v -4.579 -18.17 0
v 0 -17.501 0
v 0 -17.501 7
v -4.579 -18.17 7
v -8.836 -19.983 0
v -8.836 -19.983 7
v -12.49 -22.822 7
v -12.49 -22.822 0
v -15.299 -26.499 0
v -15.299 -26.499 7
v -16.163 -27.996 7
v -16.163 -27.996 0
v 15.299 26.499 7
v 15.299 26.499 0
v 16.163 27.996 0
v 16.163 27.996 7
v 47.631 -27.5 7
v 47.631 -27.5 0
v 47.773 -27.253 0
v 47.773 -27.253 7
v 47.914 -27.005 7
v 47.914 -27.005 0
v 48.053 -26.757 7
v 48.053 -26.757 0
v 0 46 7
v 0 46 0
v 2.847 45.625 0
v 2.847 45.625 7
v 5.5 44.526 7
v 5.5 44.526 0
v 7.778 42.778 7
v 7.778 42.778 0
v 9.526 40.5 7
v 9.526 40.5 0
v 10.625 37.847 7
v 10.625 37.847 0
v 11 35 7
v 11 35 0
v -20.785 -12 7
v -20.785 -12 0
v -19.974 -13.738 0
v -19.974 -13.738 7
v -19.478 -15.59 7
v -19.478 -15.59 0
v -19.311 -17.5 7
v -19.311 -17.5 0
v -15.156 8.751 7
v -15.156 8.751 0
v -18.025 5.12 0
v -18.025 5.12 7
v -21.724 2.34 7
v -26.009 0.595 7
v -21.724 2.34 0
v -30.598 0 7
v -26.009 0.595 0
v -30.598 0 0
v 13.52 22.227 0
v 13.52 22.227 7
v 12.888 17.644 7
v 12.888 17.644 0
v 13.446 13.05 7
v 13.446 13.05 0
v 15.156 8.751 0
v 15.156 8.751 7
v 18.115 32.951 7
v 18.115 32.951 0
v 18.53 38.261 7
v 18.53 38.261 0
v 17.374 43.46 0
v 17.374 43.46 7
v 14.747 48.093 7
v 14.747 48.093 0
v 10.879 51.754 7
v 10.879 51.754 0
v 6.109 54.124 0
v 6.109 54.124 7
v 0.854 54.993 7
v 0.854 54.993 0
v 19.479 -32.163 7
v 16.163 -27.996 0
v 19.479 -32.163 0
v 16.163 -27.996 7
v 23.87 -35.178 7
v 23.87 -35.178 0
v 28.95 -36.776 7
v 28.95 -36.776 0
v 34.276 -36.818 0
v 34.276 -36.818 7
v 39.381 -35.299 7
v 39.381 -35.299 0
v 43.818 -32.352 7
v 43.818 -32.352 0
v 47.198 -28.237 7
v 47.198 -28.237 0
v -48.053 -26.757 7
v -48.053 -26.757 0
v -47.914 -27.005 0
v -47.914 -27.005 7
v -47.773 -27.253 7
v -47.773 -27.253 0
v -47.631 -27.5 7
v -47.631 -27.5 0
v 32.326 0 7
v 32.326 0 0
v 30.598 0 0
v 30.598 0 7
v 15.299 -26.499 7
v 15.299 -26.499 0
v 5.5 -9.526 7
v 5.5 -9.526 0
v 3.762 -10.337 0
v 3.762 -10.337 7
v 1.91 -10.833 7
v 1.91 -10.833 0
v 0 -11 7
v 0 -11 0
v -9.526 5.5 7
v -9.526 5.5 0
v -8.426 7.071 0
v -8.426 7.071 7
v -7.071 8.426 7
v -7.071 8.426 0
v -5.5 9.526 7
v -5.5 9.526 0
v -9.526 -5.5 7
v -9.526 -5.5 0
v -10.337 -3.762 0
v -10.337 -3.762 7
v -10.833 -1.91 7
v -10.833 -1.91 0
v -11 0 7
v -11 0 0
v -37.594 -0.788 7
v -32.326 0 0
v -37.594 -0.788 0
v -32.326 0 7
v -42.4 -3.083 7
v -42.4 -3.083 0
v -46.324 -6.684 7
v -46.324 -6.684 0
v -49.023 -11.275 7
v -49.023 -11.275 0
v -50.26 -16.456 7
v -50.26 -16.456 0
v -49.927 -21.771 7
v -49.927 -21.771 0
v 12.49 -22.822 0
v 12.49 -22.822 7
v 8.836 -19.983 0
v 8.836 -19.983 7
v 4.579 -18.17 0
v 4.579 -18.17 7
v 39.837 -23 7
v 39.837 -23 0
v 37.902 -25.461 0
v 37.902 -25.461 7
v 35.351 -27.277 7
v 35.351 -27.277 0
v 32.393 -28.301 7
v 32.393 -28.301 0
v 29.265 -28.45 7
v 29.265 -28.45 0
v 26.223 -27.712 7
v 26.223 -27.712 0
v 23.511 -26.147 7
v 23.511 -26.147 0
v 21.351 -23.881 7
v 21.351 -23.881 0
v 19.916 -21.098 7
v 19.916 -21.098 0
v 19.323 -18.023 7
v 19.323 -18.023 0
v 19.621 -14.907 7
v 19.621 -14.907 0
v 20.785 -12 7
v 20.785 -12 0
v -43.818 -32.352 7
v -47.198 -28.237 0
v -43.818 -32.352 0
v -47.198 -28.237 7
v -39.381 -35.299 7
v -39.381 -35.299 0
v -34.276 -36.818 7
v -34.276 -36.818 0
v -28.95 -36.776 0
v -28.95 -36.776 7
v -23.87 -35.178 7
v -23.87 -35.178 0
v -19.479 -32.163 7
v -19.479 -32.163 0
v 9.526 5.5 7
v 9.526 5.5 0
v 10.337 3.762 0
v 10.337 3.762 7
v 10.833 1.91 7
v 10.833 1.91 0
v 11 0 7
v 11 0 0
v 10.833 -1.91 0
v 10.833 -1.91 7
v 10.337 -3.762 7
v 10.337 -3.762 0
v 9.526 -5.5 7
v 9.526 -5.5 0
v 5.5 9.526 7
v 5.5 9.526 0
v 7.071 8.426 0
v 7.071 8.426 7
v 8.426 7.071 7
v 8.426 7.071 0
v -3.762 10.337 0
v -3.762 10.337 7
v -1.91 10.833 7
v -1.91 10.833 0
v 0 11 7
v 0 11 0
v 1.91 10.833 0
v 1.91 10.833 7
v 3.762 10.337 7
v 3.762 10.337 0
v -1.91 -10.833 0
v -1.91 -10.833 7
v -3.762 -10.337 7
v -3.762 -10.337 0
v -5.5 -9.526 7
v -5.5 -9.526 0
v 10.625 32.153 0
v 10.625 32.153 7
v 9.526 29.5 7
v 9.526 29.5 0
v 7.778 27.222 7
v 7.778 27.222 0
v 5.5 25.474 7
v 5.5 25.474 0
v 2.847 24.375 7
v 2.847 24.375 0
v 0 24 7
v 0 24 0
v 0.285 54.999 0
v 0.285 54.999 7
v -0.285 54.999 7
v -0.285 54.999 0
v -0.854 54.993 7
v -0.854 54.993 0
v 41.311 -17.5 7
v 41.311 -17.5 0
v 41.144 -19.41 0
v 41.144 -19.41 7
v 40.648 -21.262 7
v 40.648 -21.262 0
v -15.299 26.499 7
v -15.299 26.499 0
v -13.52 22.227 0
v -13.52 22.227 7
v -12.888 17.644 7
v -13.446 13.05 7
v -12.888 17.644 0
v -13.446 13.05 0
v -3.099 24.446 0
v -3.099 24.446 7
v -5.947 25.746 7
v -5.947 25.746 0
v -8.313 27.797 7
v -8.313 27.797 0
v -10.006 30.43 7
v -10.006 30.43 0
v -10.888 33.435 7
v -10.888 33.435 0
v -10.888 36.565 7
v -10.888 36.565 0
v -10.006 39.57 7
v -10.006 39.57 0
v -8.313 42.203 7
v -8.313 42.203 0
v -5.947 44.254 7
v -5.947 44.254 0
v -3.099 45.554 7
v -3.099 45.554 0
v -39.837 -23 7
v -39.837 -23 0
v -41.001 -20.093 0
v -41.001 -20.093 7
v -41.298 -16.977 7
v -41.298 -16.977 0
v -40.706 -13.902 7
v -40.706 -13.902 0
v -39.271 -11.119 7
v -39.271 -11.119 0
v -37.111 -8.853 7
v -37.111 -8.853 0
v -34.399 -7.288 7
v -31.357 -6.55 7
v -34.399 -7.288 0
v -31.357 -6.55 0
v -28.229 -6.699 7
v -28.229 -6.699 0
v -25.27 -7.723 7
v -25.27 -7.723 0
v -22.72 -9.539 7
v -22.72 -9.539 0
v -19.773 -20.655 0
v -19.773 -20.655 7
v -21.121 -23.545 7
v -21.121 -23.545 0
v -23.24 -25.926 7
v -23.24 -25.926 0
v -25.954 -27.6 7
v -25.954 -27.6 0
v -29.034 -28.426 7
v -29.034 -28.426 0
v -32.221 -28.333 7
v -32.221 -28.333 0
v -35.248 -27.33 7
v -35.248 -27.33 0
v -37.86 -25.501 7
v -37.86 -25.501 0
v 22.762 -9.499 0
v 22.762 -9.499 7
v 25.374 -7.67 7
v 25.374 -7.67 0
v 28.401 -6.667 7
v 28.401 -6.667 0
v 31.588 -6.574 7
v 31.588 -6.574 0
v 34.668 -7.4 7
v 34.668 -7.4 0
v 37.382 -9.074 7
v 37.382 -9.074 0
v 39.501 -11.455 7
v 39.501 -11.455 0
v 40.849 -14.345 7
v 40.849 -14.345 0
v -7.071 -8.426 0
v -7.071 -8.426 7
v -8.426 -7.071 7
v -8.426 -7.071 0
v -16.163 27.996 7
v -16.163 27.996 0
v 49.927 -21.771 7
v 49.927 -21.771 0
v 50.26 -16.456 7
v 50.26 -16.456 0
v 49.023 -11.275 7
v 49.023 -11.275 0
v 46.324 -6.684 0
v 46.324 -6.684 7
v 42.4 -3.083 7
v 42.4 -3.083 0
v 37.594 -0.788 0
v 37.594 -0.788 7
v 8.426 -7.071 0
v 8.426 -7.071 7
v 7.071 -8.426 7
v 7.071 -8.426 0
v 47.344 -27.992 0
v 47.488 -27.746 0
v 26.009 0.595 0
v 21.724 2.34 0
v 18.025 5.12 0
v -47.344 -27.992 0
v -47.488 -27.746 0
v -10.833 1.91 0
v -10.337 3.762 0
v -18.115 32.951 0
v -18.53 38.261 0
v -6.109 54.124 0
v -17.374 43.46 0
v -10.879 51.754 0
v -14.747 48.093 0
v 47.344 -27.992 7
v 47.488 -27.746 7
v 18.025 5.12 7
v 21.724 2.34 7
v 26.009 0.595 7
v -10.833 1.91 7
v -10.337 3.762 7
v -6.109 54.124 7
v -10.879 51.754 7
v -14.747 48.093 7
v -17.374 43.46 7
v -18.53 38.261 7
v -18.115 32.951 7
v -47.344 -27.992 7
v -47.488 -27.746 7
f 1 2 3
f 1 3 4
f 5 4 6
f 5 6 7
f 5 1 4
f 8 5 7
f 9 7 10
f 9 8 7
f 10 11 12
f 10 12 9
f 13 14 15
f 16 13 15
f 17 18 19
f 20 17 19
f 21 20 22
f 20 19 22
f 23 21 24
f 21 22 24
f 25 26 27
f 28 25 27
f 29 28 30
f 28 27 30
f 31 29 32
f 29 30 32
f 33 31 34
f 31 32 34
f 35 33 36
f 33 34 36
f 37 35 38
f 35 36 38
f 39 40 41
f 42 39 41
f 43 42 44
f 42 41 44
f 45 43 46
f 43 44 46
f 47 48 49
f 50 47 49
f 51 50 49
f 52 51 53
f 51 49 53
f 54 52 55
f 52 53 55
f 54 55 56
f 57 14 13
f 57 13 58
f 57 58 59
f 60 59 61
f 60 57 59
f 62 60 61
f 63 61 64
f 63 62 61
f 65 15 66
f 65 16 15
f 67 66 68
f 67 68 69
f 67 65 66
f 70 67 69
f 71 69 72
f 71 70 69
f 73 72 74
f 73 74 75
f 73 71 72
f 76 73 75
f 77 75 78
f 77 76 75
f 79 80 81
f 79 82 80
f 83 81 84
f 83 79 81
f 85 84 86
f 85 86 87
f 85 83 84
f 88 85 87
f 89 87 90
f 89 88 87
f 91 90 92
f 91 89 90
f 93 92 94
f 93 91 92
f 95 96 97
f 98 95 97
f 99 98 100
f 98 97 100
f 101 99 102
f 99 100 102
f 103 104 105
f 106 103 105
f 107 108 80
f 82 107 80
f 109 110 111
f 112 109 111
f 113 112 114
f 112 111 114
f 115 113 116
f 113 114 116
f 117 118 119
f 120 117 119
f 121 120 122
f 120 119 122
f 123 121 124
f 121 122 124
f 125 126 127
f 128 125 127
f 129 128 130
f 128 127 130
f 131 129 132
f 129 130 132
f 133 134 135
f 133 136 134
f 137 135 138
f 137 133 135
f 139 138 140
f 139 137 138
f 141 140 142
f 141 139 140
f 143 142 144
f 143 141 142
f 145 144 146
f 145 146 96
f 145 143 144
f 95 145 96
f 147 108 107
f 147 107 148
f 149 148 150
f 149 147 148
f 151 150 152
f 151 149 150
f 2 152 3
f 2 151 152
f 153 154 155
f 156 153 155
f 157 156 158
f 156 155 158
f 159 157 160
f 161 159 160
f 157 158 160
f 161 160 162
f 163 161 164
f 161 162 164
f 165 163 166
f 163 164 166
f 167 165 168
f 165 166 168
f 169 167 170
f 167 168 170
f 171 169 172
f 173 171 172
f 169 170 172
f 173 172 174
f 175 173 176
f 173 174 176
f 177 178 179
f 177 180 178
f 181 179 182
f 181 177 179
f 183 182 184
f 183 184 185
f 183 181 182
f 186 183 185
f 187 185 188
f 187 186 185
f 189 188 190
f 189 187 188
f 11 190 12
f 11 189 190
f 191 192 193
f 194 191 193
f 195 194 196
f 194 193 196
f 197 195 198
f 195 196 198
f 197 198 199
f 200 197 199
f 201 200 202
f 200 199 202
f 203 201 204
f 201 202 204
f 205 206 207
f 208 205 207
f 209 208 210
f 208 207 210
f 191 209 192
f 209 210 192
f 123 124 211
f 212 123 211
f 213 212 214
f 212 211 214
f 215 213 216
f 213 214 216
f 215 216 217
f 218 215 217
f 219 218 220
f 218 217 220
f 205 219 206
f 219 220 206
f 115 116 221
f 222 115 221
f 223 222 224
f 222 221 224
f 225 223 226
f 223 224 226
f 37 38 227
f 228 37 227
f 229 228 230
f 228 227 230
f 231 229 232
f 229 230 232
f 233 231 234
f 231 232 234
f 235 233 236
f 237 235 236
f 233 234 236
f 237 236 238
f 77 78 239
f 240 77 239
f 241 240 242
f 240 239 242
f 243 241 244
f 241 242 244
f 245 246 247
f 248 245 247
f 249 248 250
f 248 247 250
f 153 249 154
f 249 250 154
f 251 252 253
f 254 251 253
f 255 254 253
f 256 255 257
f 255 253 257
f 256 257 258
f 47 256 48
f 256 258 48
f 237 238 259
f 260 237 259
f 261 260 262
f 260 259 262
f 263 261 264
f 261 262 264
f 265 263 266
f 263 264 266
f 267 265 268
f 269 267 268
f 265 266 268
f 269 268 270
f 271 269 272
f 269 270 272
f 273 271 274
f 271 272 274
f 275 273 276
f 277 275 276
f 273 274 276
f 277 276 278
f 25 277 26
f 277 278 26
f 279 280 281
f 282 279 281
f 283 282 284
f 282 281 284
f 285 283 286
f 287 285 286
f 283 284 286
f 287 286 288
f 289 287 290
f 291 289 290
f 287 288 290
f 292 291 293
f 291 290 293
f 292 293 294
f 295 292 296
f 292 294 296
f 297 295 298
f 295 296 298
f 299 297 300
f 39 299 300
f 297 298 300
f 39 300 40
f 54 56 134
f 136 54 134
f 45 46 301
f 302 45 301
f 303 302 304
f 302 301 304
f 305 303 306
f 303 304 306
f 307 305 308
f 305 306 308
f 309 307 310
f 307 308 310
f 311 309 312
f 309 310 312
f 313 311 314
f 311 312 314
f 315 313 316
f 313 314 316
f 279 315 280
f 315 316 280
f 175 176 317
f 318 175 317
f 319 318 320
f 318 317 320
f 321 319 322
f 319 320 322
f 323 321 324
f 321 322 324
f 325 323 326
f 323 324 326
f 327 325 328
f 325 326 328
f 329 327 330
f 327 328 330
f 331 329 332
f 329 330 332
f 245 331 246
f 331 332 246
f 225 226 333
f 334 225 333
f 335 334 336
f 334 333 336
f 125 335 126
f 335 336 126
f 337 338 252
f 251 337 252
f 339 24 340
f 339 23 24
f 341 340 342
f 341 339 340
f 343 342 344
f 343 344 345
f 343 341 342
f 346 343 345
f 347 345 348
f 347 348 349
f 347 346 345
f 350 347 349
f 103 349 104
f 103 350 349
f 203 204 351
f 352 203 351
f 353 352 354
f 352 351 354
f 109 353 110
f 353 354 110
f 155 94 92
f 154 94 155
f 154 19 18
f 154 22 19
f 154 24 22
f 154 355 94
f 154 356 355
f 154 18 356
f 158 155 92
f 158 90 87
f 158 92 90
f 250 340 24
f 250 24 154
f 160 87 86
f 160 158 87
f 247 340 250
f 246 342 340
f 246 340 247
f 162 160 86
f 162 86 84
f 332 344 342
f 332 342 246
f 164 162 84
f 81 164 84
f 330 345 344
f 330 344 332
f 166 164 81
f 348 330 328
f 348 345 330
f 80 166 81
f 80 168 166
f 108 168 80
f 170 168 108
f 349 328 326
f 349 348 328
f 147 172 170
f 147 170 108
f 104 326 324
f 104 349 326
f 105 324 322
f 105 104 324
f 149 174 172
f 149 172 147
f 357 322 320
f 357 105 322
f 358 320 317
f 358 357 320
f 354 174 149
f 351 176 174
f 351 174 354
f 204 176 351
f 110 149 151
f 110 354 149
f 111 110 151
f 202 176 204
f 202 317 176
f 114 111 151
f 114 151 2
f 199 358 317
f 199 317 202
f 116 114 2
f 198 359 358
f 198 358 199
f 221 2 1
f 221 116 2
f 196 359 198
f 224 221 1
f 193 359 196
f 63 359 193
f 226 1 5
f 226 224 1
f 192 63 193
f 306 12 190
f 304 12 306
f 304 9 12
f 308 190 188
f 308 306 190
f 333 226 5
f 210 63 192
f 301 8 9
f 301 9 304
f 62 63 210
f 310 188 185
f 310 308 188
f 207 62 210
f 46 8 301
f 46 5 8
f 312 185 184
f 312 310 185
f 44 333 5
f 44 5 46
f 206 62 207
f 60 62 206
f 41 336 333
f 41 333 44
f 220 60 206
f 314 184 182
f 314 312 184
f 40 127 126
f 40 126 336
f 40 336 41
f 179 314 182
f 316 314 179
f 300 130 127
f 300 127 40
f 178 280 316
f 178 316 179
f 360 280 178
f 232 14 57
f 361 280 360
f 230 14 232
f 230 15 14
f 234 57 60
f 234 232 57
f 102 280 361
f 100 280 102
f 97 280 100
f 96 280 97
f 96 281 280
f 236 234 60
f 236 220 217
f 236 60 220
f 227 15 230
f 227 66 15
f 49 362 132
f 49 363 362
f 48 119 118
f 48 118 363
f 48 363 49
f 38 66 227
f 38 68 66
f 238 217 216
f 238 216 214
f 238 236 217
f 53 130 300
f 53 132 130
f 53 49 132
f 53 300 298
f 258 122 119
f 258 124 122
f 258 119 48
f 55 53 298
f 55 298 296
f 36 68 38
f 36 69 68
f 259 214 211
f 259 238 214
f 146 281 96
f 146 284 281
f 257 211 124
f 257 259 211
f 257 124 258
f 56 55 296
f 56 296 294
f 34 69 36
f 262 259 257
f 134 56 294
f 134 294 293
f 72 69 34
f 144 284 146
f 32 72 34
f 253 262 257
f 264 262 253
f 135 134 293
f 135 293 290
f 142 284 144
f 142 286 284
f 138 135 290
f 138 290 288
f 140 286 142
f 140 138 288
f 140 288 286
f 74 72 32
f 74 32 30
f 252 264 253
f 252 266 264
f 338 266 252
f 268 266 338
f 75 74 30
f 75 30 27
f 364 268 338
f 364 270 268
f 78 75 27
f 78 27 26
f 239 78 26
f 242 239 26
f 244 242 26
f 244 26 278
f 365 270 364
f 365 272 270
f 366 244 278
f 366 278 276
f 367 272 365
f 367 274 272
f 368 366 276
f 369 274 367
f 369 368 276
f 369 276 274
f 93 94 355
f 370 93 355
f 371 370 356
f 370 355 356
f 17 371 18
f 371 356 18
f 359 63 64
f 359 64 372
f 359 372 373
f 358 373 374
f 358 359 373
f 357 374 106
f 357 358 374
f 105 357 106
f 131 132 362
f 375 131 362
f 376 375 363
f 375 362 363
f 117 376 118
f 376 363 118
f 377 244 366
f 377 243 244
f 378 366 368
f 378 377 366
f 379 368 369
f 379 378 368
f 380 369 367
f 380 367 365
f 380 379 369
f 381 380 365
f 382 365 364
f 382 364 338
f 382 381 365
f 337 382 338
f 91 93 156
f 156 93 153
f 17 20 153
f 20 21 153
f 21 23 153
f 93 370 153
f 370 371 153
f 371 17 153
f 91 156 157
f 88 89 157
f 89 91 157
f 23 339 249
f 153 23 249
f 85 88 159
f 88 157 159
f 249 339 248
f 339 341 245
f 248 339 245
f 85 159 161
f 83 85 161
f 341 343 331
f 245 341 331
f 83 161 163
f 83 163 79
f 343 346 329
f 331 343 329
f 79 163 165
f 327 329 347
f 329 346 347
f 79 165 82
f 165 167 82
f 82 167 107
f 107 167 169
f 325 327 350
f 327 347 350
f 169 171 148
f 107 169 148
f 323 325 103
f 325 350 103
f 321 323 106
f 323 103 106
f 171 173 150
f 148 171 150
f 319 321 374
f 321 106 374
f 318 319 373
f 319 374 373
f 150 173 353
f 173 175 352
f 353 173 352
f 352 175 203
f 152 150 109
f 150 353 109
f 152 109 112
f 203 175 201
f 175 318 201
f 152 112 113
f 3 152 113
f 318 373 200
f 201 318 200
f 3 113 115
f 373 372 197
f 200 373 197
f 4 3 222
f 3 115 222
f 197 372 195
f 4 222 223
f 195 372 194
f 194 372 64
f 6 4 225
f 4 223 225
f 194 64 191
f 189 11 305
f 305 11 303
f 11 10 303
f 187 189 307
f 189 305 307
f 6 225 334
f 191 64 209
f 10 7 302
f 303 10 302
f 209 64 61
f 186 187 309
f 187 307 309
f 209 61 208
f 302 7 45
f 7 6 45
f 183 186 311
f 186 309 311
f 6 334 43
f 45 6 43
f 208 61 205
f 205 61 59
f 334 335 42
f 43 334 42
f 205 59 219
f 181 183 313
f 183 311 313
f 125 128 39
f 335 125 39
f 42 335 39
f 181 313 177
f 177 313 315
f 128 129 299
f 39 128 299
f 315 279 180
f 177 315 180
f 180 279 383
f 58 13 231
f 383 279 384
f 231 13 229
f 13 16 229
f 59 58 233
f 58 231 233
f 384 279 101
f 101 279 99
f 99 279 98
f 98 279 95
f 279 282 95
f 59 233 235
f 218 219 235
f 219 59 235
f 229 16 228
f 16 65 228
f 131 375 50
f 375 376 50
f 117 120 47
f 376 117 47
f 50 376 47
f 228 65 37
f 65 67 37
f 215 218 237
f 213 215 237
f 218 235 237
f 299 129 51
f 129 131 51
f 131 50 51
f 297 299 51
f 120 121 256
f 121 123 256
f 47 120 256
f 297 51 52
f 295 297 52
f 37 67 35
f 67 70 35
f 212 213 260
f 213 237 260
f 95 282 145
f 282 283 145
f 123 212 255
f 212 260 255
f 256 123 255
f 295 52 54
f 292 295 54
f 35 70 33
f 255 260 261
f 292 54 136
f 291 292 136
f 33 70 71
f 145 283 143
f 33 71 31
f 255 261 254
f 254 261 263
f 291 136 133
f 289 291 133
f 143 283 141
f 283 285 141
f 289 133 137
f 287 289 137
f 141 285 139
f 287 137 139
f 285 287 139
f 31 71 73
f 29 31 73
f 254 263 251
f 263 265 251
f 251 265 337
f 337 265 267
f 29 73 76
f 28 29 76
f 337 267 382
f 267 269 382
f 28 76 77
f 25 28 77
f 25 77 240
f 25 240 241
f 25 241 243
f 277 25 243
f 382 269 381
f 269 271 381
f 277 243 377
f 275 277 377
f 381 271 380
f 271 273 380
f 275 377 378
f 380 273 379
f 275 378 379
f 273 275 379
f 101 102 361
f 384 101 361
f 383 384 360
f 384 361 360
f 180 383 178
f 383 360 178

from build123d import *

# Parameters (mm, degrees)
F1_DEPTH    = 7
F2_R        = 18
F3_T1_DEPTH = 7


# Not quite as in the source:
# - a fillet or chamfer that OpenCascade refuses, or shapes differently, is made with other operations: its cross-section is extruded or revolved along the edge and cut away or added


with BuildPart() as f1:
    # F0 (on Top) → F1 (new body)
    with BuildSketch(Plane.XY):
        with BuildLine():
            ThreePointArc((9.5262794416, 5.5), (10.6251840892, 2.8470094961), (11, 0))
            Line((11, 0), (15, 0))
            ThreePointArc((15, 0), (14.4888873943, 3.8822856765), (12.9903810568, 7.5))
            Line((12.9903810568, 7.5), (9.5262794416, 5.5))
        make_face()
        with BuildLine():
            ThreePointArc((5.5, 9.5262794416), (7.7781745931, 7.7781745931), (9.5262794416, 5.5))
            Line((9.5262794416, 5.5), (12.9903810568, 7.5))
            ThreePointArc((12.9903810568, 7.5), (10.6066017178, 10.6066017178), (7.5, 12.9903810568))
            Line((7.5, 12.9903810568), (5.5, 9.5262794416))
        make_face()
        with BuildLine():
            ThreePointArc((0, 11), (2.8470094961, 10.6251840892), (5.5, 9.5262794416))
            Line((5.5, 9.5262794416), (7.5, 12.9903810568))
            ThreePointArc((7.5, 12.9903810568), (3.8822856765, 14.4888873943), (0, 15))
            Line((0, 15), (0, 11))
        make_face()
        with BuildLine():
            ThreePointArc((-5.5, 9.5262794416), (-2.8470094961, 10.6251840892), (0, 11))
            Line((0, 11), (0, 15))
            ThreePointArc((0, 15), (-3.8822856765, 14.4888873943), (-7.5, 12.9903810568))
            Line((-7.5, 12.9903810568), (-5.5, 9.5262794416))
        make_face()
        with BuildLine():
            ThreePointArc((-9.5262794416, 5.5), (-7.7781745931, 7.7781745931), (-5.5, 9.5262794416))
            Line((-5.5, 9.5262794416), (-7.5, 12.9903810568))
            ThreePointArc((-7.5, 12.9903810568), (-10.6066017178, 10.6066017178), (-12.9903810568, 7.5))
            Line((-12.9903810568, 7.5), (-9.5262794416, 5.5))
        make_face()
        with BuildLine():
            ThreePointArc((-11, 0), (-10.6251840892, 2.8470094961), (-9.5262794416, 5.5))
            Line((-9.5262794416, 5.5), (-12.9903810568, 7.5))
            ThreePointArc((-12.9903810568, 7.5), (-14.4888873943, 3.8822856765), (-15, 0))
            Line((-15, 0), (-11, 0))
        make_face()
        with BuildLine():
            Line((-12.9903810568, -7.5), (-9.5262794416, -5.5))
            ThreePointArc((-9.5262794416, -5.5), (-10.6251840892, -2.8470094961), (-11, 0))
            Line((-11, 0), (-15, 0))
            ThreePointArc((-15, 0), (-14.4888873943, -3.8822856765), (-12.9903810568, -7.5))
        make_face()
        with BuildLine():
            Line((-7.5, -12.9903810568), (-5.5, -9.5262794416))
            ThreePointArc((-5.5, -9.5262794416), (-7.7781745931, -7.7781745931), (-9.5262794416, -5.5))
            Line((-9.5262794416, -5.5), (-12.9903810568, -7.5))
            ThreePointArc((-12.9903810568, -7.5), (-10.6066017178, -10.6066017178), (-7.5, -12.9903810568))
        make_face()
        with BuildLine():
            Line((0, -15), (0, -11))
            ThreePointArc((0, -11), (-2.8470094961, -10.6251840892), (-5.5, -9.5262794416))
            Line((-5.5, -9.5262794416), (-7.5, -12.9903810568))
            ThreePointArc((-7.5, -12.9903810568), (-3.8822856765, -14.4888873943), (0, -15))
        make_face()
        with BuildLine():
            Line((7.5, -12.9903810568), (5.5, -9.5262794416))
            ThreePointArc((5.5, -9.5262794416), (2.8470094961, -10.6251840892), (0, -11))
            Line((0, -11), (0, -15))
            ThreePointArc((0, -15), (3.8822856765, -14.4888873943), (7.5, -12.9903810568))
        make_face()
        with BuildLine():
            Line((12.9903810568, -7.5), (9.5262794416, -5.5))
            ThreePointArc((9.5262794416, -5.5), (7.7781745931, -7.7781745931), (5.5, -9.5262794416))
            Line((5.5, -9.5262794416), (7.5, -12.9903810568))
            ThreePointArc((7.5, -12.9903810568), (10.6066017178, -10.6066017178), (12.9903810568, -7.5))
        make_face()
        with BuildLine():
            Line((15, 0), (11, 0))
            ThreePointArc((11, 0), (10.6251840892, -2.8470094961), (9.5262794416, -5.5))
            Line((9.5262794416, -5.5), (12.9903810568, -7.5))
            ThreePointArc((12.9903810568, -7.5), (14.4888873943, -3.8822856765), (15, 0))
        make_face()
        with BuildLine():
            Line((-8.75, -15.1554445662), (-7.5, -12.9903810568))
            ThreePointArc((-7.5, -12.9903810568), (-10.6066017178, -10.6066017178), (-12.9903810568, -7.5))
            Line((-12.9903810568, -7.5), (-15.1554445662, -8.75))
            ThreePointArc((-15.1554445662, -8.75), (-12.3743686708, -12.3743686708), (-8.75, -15.1554445662))
        make_face()
        with BuildLine():
            ThreePointArc((-7.5, 12.9903810568), (-3.8822856765, 14.4888873943), (0, 15))
            Line((0, 15), (0, 17.5))
            ThreePointArc((0, 17.5), (-4.5293332893, 16.9037019601), (-8.75, 15.1554445662))
            Line((-8.75, 15.1554445662), (-7.5, 12.9903810568))
        make_face()
        with BuildLine():
            ThreePointArc((0, 15), (3.8822856765, 14.4888873943), (7.5, 12.9903810568))
            Line((7.5, 12.9903810568), (8.75, 15.1554445662))
            ThreePointArc((8.75, 15.1554445662), (4.5293332893, 16.9037019601), (0, 17.5))
            Line((0, 17.5), (0, 15))
        make_face()
        with BuildLine():
            Line((-15.1554445662, -8.75), (-12.9903810568, -7.5))
            ThreePointArc((-12.9903810568, -7.5), (-14.4888873943, -3.8822856765), (-15, 0))
            Line((-15, 0), (-17.5, 0))
            ThreePointArc((-17.5, 0), (-16.9037019601, -4.5293332893), (-15.1554445662, -8.75))
        make_face()
        with BuildLine():
            Line((17.5, 0), (15, 0))
            ThreePointArc((15, 0), (14.4888873943, -3.8822856765), (12.9903810568, -7.5))
            Line((12.9903810568, -7.5), (15.1554445662, -8.75))
            ThreePointArc((15.1554445662, -8.75), (16.9037019601, -4.5293332893), (17.5, 0))
        make_face()
        with BuildLine():
            Line((15.1554445662, -8.75), (12.9903810568, -7.5))
            ThreePointArc((12.9903810568, -7.5), (10.6066017178, -10.6066017178), (7.5, -12.9903810568))
            Line((7.5, -12.9903810568), (8.75, -15.1554445662))
            ThreePointArc((8.75, -15.1554445662), (12.3743686708, -12.3743686708), (15.1554445662, -8.75))
        make_face()
        with BuildLine():
            Line((-20.7846096908, -12), (-17.3205080757, -10))
            ThreePointArc((-17.3205080757, -10), (-37.8108891325, -4.5096189432), (-43.3012701892, -25))
            Line((-43.3012701892, -25), (-39.8371685741, -23))
            ThreePointArc((-39.8371685741, -23), (-35.8108891325, -7.9737205584), (-20.7846096908, -12))
        make_face()
        with BuildLine():
            ThreePointArc((45.3108891325, -17.5), (34.193174809, -3.0111126057), (17.3205080757, -10))
            Line((17.3205080757, -10), (20.7846096908, -12))
            ThreePointArc((20.7846096908, -12), (33.1578986286, -6.8748159108), (41.3108891325, -17.5))
            ThreePointArc((41.3108891325, -17.5), (40.9360732216, -20.3470094961), (39.8371685741, -23))
            Line((39.8371685741, -23), (43.3012701892, -25))
            ThreePointArc((43.3012701892, -25), (44.7997765268, -21.3822856765), (45.3108891325, -17.5))
        make_face()
        with BuildLine():
            Line((20.7846096908, -12), (17.3205080757, -10))
            ThreePointArc((17.3205080757, -10), (22.8108891325, -30.4903810568), (43.3012701892, -25))
            Line((43.3012701892, -25), (39.8371685741, -23))
            ThreePointArc((39.8371685741, -23), (24.8108891325, -27.0262794416), (20.7846096908, -12))
        make_face()
        with BuildLine():
            ThreePointArc((0, 50), (-15, 35), (0, 20))
            Line((0, 20), (0, 24))
            ThreePointArc((0, 24), (-11, 35), (0, 46))
            Line((0, 46), (0, 50))
        make_face()
        with BuildLine():
            Line((0, 24), (0, 20))
            ThreePointArc((0, 20), (10.6066017178, 24.3933982822), (15, 35))
            ThreePointArc((15, 35), (10.6066017178, 45.6066017178), (0, 50))
            Line((0, 50), (0, 46))
            ThreePointArc((0, 46), (7.7781745931, 42.7781745931), (11, 35))
            ThreePointArc((11, 35), (7.7781745931, 27.2218254069), (0, 24))
        make_face()
        with BuildLine():
            ThreePointArc((-15.3108891325, -17.5), (-15.8220017381, -13.6177143235), (-17.3205080757, -10))
            Line((-17.3205080757, -10), (-20.7846096908, -12))
            ThreePointArc((-20.7846096908, -12), (-19.6857050433, -14.6529905039), (-19.3108891325, -17.5))
            ThreePointArc((-19.3108891325, -17.5), (-27.4638796363, -28.1251840892), (-39.8371685741, -23))
            Line((-39.8371685741, -23), (-43.3012701892, -25))
            ThreePointArc((-43.3012701892, -25), (-26.4286034559, -31.9888873943), (-15.3108891325, -17.5))
        make_face()
        with BuildLine():
            ThreePointArc((-8.75, 15.1554445662), (-4.5293332893, 16.9037019601), (0, 17.5))
            Line((0, 17.5), (0, 20))
            ThreePointArc((0, 20), (-15, 35), (0, 50))
            Line((0, 50), (0, 55))
            ThreePointArc((0, 55), (-14.2350474806, 53.1259204459), (-27.5, 47.6313972081))
            Line((-27.5, 47.6313972081), (-8.75, 15.1554445662))
        make_face()
        with BuildLine():
            ThreePointArc((-12.9903810568, 7.5), (-10.6066017178, 10.6066017178), (-7.5, 12.9903810568))
            Line((-7.5, 12.9903810568), (-8.75, 15.1554445662))
            ThreePointArc((-8.75, 15.1554445662), (-12.3743686708, 12.3743686708), (-15.1554445662, 8.75))
            Line((-15.1554445662, 8.75), (-12.9903810568, 7.5))
        make_face()
        with BuildLine():
            Line((-17.3205080757, -10), (-15.1554445662, -8.75))
            ThreePointArc((-15.1554445662, -8.75), (-16.9037019601, -4.5293332893), (-17.5, 0))
            Line((-17.5, 0), (-55, 0))
            ThreePointArc((-55, 0), (-53.1259204459, -14.2350474806), (-47.6313972081, -27.5))
            Line((-47.6313972081, -27.5), (-43.3012701892, -25))
            ThreePointArc((-43.3012701892, -25), (-37.8108891325, -4.5096189432), (-17.3205080757, -10))
        make_face()
        with BuildLine():
            Line((-27.5, -47.6313972081), (-8.75, -15.1554445662))
            ThreePointArc((-8.75, -15.1554445662), (-12.3743686708, -12.3743686708), (-15.1554445662, -8.75))
            Line((-15.1554445662, -8.75), (-17.3205080757, -10))
            ThreePointArc((-17.3205080757, -10), (-15.8220017381, -13.6177143235), (-15.3108891325, -17.5))
            ThreePointArc((-15.3108891325, -17.5), (-26.4286034559, -31.9888873943), (-43.3012701892, -25))
            Line((-43.3012701892, -25), (-47.6313972081, -27.5))
            ThreePointArc((-47.6313972081, -27.5), (-38.8908729653, -38.8908729653), (-27.5, -47.6313972081))
        make_face()
        with BuildLine():
            Line((0, -17.5), (0, -15))
            ThreePointArc((0, -15), (-3.8822856765, -14.4888873943), (-7.5, -12.9903810568))
            Line((-7.5, -12.9903810568), (-8.75, -15.1554445662))
            ThreePointArc((-8.75, -15.1554445662), (-4.5293332893, -16.9037019601), (0, -17.5))
        make_face()
        with BuildLine():
            Line((8.75, -15.1554445662), (7.5, -12.9903810568))
            ThreePointArc((7.5, -12.9903810568), (3.8822856765, -14.4888873943), (0, -15))
            Line((0, -15), (0, -17.5))
            ThreePointArc((0, -17.5), (4.5293332893, -16.9037019601), (8.75, -15.1554445662))
        make_face()
        with BuildLine():
            Line((17.3205080757, -10), (15.1554445662, -8.75))
            ThreePointArc((15.1554445662, -8.75), (12.3743686708, -12.3743686708), (8.75, -15.1554445662))
            Line((8.75, -15.1554445662), (27.5, -47.6313972081))
            ThreePointArc((27.5, -47.6313972081), (38.8908729653, -38.8908729653), (47.6313972081, -27.5))
            Line((47.6313972081, -27.5), (43.3012701892, -25))
            ThreePointArc((43.3012701892, -25), (22.8108891325, -30.4903810568), (17.3205080757, -10))
        make_face()
        with BuildLine():
            ThreePointArc((-15, 0), (-14.4888873943, 3.8822856765), (-12.9903810568, 7.5))
            Line((-12.9903810568, 7.5), (-15.1554445662, 8.75))
            ThreePointArc((-15.1554445662, 8.75), (-16.9037019601, 4.5293332893), (-17.5, 0))
            Line((-17.5, 0), (-15, 0))
        make_face()
        with BuildLine():
            ThreePointArc((0, 17.5), (4.5293332893, 16.9037019601), (8.75, 15.1554445662))
            Line((8.75, 15.1554445662), (27.5, 47.6313972081))
            ThreePointArc((27.5, 47.6313972081), (14.2350474806, 53.1259204459), (0, 55))
            Line((0, 55), (0, 50))
            ThreePointArc((0, 50), (10.6066017178, 45.6066017178), (15, 35))
            ThreePointArc((15, 35), (10.6066017178, 24.3933982822), (0, 20))
            Line((0, 20), (0, 17.5))
        make_face()
        with BuildLine():
            Line((55, 0), (17.5, 0))
            ThreePointArc((17.5, 0), (16.9037019601, -4.5293332893), (15.1554445662, -8.75))
            Line((15.1554445662, -8.75), (17.3205080757, -10))
            ThreePointArc((17.3205080757, -10), (34.193174809, -3.0111126057), (45.3108891325, -17.5))
            ThreePointArc((45.3108891325, -17.5), (44.7997765268, -21.3822856765), (43.3012701892, -25))
            Line((43.3012701892, -25), (47.6313972081, -27.5))
            ThreePointArc((47.6313972081, -27.5), (53.1259204459, -14.2350474806), (55, 0))
        make_face()
        with BuildLine():
            ThreePointArc((7.5, 12.9903810568), (10.6066017178, 10.6066017178), (12.9903810568, 7.5))
            Line((12.9903810568, 7.5), (15.1554445662, 8.75))
            ThreePointArc((15.1554445662, 8.75), (12.3743686708, 12.3743686708), (8.75, 15.1554445662))
            Line((8.75, 15.1554445662), (7.5, 12.9903810568))
        make_face()
        with BuildLine():
            ThreePointArc((12.9903810568, 7.5), (14.4888873943, 3.8822856765), (15, 0))
            Line((15, 0), (17.5, 0))
            ThreePointArc((17.5, 0), (16.9037019601, 4.5293332893), (15.1554445662, 8.75))
            Line((15.1554445662, 8.75), (12.9903810568, 7.5))
        make_face()
    extrude(amount=F1_DEPTH)

    # F2
    f2_edges = [f1.edges().sort_by_distance(p)[0] for p in [
        (-27.5, -47.631397, 3.5),
        (27.5, -47.631397, 3.5),
        (55, 0, 3.5),
        (27.5, 47.631397, 3.5),
        (-55, 0, 3.5),
        (-27.5, 47.631397, 3.5),
    ]]
    fillet(f2_edges, radius=F2_R)

    # F3: fillet of radius 18 on 6 edges, made by hand

    # F3_s2 → F3_t1 (join)
    with BuildSketch(Plane.XY):
        with BuildLine():
            ThreePointArc((15.0836209811, 8.8732394366), (21.6618075989, 2.3749929577), (30.5982025616, 0))
            Line((30.5982025616, 0), (17.5, 0))
            ThreePointArc((17.5, 0), (16.8851024156, 4.5981862093), (15.0836209811, 8.8732394366))
        make_face()
        with BuildLine():
            ThreePointArc((15.2991012808, 26.4988207285), (12.8877080347, 17.5721791936), (15.2262612565, 8.6261792323))
            ThreePointArc((15.2262612565, 8.6261792323), (12.4246972764, 12.3238345327), (8.75, 15.1554445662))
            Line((8.75, 15.1554445662), (15.2991012808, 26.4988207285))
        make_face()
        with BuildLine():
            ThreePointArc((0.1426402754, -17.499418669), (-8.7740995642, -19.9471721514), (-15.2991012808, -26.4988207285))
            Line((-15.2991012808, -26.4988207285), (-8.75, -15.1554445662))
            ThreePointArc((-8.75, -15.1554445662), (-4.4604051392, -16.9220207421), (0.1426402754, -17.499418669))
        make_face()
        with BuildLine():
            ThreePointArc((15.2991012808, -26.4988207285), (8.7740995642, -19.9471721514), (-0.1426402754, -17.499418669))
            ThreePointArc((-0.1426402754, -17.499418669), (4.4604051392, -16.9220207421), (8.75, -15.1554445662))
            Line((8.75, -15.1554445662), (15.2991012808, -26.4988207285))
        make_face()
        with BuildLine():
            ThreePointArc((-15.2991012808, 26.4988207285), (-12.8877080347, 17.5721791936), (-15.2262612565, 8.6261792323))
            ThreePointArc((-15.2262612565, 8.6261792323), (-12.4246972764, 12.3238345327), (-8.75, 15.1554445662))
            Line((-8.75, 15.1554445662), (-15.2991012808, 26.4988207285))
        make_face()
        with BuildLine():
            ThreePointArc((-15.0836209811, 8.8732394366), (-21.6618075989, 2.3749929577), (-30.5982025616, 0))
            Line((-30.5982025616, 0), (-17.5, 0))
            ThreePointArc((-17.5, 0), (-16.8851024156, 4.5981862093), (-15.0836209811, 8.8732394366))
        make_face()
    extrude(amount=F3_T1_DEPTH)


solid = f1.part
